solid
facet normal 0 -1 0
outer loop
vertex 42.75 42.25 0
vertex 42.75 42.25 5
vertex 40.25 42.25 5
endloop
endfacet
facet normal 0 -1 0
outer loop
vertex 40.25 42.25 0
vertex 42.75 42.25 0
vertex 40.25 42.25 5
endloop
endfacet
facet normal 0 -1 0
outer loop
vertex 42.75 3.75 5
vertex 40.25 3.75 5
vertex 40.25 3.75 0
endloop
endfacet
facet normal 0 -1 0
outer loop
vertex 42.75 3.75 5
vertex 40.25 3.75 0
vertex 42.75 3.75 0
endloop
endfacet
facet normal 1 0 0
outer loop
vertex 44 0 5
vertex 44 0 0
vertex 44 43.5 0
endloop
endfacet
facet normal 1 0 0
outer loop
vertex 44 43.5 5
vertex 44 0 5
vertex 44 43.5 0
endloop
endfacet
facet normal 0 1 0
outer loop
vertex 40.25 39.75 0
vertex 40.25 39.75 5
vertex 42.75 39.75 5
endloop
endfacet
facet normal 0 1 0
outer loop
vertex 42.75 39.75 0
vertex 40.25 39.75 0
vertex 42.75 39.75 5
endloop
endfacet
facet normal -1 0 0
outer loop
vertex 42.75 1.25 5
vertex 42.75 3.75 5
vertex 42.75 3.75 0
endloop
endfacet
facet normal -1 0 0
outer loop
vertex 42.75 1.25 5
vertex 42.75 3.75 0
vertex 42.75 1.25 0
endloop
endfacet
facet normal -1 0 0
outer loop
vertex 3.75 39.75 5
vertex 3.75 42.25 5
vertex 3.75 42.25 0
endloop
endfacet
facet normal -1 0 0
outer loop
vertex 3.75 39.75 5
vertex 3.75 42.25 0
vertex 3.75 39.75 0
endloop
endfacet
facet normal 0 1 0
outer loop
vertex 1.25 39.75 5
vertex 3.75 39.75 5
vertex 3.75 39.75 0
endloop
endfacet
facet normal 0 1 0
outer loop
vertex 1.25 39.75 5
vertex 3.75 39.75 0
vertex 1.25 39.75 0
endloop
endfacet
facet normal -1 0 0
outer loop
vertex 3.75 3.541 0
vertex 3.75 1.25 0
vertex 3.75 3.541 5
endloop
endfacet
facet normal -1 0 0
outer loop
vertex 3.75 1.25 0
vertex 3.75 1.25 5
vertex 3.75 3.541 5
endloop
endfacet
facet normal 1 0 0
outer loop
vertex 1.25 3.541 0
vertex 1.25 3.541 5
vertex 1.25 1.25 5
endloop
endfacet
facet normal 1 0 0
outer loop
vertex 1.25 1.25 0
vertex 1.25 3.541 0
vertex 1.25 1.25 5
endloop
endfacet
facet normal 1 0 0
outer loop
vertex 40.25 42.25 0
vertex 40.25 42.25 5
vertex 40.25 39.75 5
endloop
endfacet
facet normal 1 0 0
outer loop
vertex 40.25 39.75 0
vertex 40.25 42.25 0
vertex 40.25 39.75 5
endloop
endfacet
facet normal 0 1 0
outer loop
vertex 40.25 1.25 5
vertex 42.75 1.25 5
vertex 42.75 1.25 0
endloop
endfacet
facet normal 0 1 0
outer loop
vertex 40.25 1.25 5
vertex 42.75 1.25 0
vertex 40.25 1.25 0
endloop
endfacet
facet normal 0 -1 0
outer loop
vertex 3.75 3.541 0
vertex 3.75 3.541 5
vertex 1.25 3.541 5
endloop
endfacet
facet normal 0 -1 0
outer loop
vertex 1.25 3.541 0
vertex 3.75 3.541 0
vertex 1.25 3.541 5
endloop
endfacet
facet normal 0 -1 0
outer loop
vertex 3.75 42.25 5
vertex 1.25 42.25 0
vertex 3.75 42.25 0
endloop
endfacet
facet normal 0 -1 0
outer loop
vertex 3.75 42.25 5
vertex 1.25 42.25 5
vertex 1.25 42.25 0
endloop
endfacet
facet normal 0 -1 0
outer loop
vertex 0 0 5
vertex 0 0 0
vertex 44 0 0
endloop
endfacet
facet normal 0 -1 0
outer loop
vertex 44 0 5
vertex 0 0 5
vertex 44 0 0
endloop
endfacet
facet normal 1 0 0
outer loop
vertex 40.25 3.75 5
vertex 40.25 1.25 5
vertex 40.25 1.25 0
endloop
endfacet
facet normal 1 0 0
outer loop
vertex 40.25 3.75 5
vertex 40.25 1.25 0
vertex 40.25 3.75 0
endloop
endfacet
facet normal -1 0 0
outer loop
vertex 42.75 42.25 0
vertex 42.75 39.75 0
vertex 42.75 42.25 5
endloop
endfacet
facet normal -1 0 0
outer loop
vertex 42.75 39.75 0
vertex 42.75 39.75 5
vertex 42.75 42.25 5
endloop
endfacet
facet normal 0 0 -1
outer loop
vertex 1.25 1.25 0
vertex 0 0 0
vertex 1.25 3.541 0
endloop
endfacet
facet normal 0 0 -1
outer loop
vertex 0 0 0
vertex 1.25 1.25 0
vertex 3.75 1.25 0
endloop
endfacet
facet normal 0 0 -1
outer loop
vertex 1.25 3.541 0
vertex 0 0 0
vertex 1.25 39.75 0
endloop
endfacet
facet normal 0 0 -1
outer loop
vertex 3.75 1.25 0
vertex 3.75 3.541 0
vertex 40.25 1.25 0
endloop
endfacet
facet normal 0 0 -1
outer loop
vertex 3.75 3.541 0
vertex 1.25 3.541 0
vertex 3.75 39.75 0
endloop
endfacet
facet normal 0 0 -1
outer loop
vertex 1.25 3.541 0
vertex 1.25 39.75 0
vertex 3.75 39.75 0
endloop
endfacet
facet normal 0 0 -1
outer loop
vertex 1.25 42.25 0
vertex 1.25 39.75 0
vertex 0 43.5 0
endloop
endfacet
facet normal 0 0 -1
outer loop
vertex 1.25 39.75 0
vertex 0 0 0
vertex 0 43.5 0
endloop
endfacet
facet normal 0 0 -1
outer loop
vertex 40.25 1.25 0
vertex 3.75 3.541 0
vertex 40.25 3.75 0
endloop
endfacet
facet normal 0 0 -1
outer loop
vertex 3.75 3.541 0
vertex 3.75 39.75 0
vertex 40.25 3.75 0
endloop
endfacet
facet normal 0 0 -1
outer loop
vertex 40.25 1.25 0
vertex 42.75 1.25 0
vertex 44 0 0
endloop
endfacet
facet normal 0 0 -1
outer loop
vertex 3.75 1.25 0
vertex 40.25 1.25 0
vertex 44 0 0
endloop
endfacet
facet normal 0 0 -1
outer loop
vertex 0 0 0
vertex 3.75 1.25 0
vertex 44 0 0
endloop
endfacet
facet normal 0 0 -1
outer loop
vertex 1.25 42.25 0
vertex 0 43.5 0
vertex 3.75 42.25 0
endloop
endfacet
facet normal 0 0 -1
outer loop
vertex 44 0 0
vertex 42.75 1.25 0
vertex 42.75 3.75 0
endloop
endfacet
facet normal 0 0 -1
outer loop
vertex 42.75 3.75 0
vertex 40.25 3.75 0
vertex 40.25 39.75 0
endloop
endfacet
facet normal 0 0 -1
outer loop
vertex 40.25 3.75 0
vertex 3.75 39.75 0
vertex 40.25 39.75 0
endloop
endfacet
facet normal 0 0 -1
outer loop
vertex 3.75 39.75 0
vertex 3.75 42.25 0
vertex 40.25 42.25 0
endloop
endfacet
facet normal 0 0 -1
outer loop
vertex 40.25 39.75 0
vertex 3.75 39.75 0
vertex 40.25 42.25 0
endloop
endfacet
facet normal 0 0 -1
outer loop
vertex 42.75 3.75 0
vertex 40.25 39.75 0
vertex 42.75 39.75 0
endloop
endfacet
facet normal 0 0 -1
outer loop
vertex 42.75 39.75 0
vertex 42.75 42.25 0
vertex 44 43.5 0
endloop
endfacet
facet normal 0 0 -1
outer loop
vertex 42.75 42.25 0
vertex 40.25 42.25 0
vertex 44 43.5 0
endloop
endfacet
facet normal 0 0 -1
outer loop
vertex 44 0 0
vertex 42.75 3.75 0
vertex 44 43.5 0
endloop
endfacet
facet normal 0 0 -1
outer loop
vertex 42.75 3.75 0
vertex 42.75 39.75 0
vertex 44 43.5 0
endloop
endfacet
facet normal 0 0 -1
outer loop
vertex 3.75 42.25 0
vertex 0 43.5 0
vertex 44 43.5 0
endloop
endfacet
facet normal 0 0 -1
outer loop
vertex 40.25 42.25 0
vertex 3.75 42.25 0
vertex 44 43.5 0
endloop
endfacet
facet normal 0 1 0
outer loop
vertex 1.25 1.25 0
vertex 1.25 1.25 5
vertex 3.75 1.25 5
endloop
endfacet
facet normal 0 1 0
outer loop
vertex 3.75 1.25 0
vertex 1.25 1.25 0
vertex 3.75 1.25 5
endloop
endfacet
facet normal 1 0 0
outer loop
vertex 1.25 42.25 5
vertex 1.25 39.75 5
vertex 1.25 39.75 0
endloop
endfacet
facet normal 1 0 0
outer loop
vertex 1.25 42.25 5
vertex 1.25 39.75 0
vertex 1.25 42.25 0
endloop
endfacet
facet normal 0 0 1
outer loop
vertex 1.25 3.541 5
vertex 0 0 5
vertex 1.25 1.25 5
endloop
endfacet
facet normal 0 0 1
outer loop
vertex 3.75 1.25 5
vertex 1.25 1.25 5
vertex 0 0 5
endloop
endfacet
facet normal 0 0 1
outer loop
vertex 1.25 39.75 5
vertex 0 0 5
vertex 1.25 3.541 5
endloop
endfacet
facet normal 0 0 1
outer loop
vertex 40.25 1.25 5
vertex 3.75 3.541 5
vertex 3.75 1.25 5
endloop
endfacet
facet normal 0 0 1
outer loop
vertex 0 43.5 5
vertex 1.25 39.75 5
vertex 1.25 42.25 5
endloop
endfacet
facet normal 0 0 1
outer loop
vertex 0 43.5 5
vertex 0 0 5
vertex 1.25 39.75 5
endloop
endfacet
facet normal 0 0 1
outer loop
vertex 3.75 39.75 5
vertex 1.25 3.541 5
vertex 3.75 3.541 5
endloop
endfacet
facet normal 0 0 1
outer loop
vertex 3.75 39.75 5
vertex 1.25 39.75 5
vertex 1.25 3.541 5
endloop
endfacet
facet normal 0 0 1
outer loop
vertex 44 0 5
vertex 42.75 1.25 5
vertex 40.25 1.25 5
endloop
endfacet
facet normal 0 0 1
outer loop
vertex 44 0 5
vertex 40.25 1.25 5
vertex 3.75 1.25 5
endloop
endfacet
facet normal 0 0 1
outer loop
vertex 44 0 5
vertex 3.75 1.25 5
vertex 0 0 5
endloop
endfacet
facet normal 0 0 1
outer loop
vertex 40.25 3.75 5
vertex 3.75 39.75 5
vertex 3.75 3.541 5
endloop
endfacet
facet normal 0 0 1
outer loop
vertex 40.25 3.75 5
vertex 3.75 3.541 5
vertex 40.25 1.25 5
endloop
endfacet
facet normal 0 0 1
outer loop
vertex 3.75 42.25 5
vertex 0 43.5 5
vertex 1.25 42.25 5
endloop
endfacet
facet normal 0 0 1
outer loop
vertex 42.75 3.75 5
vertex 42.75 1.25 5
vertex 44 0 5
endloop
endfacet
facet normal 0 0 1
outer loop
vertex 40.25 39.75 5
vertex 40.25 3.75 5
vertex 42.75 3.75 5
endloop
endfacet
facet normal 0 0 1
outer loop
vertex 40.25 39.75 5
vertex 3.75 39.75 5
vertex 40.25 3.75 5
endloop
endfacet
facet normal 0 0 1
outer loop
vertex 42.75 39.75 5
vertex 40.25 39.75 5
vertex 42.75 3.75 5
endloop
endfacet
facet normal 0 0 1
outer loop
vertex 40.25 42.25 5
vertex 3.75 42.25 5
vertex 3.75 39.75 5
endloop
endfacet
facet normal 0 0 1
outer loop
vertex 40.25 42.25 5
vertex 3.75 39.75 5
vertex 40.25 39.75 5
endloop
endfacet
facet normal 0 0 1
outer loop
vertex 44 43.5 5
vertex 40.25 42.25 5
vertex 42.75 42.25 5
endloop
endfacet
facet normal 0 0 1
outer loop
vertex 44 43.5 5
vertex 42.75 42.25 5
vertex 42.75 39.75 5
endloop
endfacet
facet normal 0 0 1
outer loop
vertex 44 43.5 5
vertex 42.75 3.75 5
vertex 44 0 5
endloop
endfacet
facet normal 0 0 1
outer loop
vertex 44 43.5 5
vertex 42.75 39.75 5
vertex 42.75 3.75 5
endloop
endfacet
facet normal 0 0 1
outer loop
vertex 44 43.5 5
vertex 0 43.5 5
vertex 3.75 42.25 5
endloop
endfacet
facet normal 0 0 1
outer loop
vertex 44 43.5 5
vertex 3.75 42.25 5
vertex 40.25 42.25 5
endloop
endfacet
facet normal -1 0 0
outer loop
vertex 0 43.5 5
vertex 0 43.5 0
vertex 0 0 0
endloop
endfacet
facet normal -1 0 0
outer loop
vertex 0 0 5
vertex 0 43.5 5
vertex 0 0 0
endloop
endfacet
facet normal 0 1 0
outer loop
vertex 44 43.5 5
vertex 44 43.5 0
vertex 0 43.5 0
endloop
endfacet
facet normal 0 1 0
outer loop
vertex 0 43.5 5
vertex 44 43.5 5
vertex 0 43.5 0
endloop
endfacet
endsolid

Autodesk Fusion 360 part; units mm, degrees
sketch "Sketch1" plane through (0, 0, 0) normal (0, 0, 1) x (1, 0, 0)
  line L0 (0, 0) -> (44, 0)
  line L1 (44, 0) -> (44, 43.5)
  line L2 (44, 43.5) -> (0, 43.5)
  line L3 (0, 43.5) -> (0, 0)
  dimension "d1" = 44
  dimension "d2" = 43.5
extrude "Extrude1" add sketch "Sketch1" along normal blind 5
sketch "Sketch2" plane through (0, 0, 5) normal (0, 0, 1) x (-1, 0, 0)
  line L0 (0, -43.5) -> (0, 0)
  line L1 (0, 0) -> (-44, 0)
  line L2 (-44, 0) -> (-44, -43.5)
  line L3 (-44, -43.5) -> (0, -43.5)
  line L4 (0, 0) -> (0, -1.25)
  line L5 (0, -1.25) -> (-1.25, -1.25)
  line L6 (-1.25, -1.25) -> (-3.75, -1.25)
  line L7 (-3.75, -1.25) -> (-3.75, -3.541)
  line L8 (-3.75, -3.541) -> (-1.25, -3.541)
  line L9 (-1.25, -3.541) -> (-1.25, -1.25)
  line L10 (-44, 0) -> (-42.75, 0)
  line L11 (-42.75, 0) -> (-42.75, -1.25)
  line L12 (-42.75, -1.25) -> (-40.25, -1.25)
  line L13 (-40.25, -1.25) -> (-40.25, -3.75)
  line L14 (-40.25, -3.75) -> (-42.75, -3.75)
  line L15 (-42.75, -3.75) -> (-42.75, -1.25)
  line L16 (0, -43.5) -> (-1.25, -43.5)
  line L17 (-1.25, -43.5) -> (-1.25, -42.25)
  line L18 (-1.25, -42.25) -> (-3.75, -42.25)
  line L19 (-3.75, -42.25) -> (-3.75, -39.75)
  line L20 (-3.75, -39.75) -> (-1.25, -39.75)
  line L21 (-1.25, -39.75) -> (-1.25, -42.25)
  line L22 (-44, -43.5) -> (-42.75, -43.5)
  line L23 (-42.75, -43.5) -> (-42.75, -42.25)
  line L24 (-42.75, -42.25) -> (-40.25, -42.25)
  line L25 (-40.25, -42.25) -> (-40.25, -39.75)
  line L26 (-40.25, -39.75) -> (-42.75, -39.75)
  line L27 (-42.75, -39.75) -> (-42.75, -42.25)
  dimension "d5" = 1.25
  dimension "d6" = 1.25
  dimension "d7" = 2.5
  dimension "d8" = 1.25
  dimension "d9" = 1.25
  dimension "d10" = 2.5
  dimension "d11" = 2.5
  dimension "d12" = 1.25
  dimension "d13" = 1.25
  dimension "d14" = 2.5
  dimension "d15" = 2.5
  dimension "d16" = 1.25
  dimension "d17" = 1.25
  dimension "d18" = 2.5
  dimension "d19" = 2.5
extrude "Extrude2" cut sketch "Sketch2" against normal blind 1000 contours L6 L7 L8 L9 | L12 L13 L14 L15 | L24 L25 L26 L27 | L18 L19 L20 L21
